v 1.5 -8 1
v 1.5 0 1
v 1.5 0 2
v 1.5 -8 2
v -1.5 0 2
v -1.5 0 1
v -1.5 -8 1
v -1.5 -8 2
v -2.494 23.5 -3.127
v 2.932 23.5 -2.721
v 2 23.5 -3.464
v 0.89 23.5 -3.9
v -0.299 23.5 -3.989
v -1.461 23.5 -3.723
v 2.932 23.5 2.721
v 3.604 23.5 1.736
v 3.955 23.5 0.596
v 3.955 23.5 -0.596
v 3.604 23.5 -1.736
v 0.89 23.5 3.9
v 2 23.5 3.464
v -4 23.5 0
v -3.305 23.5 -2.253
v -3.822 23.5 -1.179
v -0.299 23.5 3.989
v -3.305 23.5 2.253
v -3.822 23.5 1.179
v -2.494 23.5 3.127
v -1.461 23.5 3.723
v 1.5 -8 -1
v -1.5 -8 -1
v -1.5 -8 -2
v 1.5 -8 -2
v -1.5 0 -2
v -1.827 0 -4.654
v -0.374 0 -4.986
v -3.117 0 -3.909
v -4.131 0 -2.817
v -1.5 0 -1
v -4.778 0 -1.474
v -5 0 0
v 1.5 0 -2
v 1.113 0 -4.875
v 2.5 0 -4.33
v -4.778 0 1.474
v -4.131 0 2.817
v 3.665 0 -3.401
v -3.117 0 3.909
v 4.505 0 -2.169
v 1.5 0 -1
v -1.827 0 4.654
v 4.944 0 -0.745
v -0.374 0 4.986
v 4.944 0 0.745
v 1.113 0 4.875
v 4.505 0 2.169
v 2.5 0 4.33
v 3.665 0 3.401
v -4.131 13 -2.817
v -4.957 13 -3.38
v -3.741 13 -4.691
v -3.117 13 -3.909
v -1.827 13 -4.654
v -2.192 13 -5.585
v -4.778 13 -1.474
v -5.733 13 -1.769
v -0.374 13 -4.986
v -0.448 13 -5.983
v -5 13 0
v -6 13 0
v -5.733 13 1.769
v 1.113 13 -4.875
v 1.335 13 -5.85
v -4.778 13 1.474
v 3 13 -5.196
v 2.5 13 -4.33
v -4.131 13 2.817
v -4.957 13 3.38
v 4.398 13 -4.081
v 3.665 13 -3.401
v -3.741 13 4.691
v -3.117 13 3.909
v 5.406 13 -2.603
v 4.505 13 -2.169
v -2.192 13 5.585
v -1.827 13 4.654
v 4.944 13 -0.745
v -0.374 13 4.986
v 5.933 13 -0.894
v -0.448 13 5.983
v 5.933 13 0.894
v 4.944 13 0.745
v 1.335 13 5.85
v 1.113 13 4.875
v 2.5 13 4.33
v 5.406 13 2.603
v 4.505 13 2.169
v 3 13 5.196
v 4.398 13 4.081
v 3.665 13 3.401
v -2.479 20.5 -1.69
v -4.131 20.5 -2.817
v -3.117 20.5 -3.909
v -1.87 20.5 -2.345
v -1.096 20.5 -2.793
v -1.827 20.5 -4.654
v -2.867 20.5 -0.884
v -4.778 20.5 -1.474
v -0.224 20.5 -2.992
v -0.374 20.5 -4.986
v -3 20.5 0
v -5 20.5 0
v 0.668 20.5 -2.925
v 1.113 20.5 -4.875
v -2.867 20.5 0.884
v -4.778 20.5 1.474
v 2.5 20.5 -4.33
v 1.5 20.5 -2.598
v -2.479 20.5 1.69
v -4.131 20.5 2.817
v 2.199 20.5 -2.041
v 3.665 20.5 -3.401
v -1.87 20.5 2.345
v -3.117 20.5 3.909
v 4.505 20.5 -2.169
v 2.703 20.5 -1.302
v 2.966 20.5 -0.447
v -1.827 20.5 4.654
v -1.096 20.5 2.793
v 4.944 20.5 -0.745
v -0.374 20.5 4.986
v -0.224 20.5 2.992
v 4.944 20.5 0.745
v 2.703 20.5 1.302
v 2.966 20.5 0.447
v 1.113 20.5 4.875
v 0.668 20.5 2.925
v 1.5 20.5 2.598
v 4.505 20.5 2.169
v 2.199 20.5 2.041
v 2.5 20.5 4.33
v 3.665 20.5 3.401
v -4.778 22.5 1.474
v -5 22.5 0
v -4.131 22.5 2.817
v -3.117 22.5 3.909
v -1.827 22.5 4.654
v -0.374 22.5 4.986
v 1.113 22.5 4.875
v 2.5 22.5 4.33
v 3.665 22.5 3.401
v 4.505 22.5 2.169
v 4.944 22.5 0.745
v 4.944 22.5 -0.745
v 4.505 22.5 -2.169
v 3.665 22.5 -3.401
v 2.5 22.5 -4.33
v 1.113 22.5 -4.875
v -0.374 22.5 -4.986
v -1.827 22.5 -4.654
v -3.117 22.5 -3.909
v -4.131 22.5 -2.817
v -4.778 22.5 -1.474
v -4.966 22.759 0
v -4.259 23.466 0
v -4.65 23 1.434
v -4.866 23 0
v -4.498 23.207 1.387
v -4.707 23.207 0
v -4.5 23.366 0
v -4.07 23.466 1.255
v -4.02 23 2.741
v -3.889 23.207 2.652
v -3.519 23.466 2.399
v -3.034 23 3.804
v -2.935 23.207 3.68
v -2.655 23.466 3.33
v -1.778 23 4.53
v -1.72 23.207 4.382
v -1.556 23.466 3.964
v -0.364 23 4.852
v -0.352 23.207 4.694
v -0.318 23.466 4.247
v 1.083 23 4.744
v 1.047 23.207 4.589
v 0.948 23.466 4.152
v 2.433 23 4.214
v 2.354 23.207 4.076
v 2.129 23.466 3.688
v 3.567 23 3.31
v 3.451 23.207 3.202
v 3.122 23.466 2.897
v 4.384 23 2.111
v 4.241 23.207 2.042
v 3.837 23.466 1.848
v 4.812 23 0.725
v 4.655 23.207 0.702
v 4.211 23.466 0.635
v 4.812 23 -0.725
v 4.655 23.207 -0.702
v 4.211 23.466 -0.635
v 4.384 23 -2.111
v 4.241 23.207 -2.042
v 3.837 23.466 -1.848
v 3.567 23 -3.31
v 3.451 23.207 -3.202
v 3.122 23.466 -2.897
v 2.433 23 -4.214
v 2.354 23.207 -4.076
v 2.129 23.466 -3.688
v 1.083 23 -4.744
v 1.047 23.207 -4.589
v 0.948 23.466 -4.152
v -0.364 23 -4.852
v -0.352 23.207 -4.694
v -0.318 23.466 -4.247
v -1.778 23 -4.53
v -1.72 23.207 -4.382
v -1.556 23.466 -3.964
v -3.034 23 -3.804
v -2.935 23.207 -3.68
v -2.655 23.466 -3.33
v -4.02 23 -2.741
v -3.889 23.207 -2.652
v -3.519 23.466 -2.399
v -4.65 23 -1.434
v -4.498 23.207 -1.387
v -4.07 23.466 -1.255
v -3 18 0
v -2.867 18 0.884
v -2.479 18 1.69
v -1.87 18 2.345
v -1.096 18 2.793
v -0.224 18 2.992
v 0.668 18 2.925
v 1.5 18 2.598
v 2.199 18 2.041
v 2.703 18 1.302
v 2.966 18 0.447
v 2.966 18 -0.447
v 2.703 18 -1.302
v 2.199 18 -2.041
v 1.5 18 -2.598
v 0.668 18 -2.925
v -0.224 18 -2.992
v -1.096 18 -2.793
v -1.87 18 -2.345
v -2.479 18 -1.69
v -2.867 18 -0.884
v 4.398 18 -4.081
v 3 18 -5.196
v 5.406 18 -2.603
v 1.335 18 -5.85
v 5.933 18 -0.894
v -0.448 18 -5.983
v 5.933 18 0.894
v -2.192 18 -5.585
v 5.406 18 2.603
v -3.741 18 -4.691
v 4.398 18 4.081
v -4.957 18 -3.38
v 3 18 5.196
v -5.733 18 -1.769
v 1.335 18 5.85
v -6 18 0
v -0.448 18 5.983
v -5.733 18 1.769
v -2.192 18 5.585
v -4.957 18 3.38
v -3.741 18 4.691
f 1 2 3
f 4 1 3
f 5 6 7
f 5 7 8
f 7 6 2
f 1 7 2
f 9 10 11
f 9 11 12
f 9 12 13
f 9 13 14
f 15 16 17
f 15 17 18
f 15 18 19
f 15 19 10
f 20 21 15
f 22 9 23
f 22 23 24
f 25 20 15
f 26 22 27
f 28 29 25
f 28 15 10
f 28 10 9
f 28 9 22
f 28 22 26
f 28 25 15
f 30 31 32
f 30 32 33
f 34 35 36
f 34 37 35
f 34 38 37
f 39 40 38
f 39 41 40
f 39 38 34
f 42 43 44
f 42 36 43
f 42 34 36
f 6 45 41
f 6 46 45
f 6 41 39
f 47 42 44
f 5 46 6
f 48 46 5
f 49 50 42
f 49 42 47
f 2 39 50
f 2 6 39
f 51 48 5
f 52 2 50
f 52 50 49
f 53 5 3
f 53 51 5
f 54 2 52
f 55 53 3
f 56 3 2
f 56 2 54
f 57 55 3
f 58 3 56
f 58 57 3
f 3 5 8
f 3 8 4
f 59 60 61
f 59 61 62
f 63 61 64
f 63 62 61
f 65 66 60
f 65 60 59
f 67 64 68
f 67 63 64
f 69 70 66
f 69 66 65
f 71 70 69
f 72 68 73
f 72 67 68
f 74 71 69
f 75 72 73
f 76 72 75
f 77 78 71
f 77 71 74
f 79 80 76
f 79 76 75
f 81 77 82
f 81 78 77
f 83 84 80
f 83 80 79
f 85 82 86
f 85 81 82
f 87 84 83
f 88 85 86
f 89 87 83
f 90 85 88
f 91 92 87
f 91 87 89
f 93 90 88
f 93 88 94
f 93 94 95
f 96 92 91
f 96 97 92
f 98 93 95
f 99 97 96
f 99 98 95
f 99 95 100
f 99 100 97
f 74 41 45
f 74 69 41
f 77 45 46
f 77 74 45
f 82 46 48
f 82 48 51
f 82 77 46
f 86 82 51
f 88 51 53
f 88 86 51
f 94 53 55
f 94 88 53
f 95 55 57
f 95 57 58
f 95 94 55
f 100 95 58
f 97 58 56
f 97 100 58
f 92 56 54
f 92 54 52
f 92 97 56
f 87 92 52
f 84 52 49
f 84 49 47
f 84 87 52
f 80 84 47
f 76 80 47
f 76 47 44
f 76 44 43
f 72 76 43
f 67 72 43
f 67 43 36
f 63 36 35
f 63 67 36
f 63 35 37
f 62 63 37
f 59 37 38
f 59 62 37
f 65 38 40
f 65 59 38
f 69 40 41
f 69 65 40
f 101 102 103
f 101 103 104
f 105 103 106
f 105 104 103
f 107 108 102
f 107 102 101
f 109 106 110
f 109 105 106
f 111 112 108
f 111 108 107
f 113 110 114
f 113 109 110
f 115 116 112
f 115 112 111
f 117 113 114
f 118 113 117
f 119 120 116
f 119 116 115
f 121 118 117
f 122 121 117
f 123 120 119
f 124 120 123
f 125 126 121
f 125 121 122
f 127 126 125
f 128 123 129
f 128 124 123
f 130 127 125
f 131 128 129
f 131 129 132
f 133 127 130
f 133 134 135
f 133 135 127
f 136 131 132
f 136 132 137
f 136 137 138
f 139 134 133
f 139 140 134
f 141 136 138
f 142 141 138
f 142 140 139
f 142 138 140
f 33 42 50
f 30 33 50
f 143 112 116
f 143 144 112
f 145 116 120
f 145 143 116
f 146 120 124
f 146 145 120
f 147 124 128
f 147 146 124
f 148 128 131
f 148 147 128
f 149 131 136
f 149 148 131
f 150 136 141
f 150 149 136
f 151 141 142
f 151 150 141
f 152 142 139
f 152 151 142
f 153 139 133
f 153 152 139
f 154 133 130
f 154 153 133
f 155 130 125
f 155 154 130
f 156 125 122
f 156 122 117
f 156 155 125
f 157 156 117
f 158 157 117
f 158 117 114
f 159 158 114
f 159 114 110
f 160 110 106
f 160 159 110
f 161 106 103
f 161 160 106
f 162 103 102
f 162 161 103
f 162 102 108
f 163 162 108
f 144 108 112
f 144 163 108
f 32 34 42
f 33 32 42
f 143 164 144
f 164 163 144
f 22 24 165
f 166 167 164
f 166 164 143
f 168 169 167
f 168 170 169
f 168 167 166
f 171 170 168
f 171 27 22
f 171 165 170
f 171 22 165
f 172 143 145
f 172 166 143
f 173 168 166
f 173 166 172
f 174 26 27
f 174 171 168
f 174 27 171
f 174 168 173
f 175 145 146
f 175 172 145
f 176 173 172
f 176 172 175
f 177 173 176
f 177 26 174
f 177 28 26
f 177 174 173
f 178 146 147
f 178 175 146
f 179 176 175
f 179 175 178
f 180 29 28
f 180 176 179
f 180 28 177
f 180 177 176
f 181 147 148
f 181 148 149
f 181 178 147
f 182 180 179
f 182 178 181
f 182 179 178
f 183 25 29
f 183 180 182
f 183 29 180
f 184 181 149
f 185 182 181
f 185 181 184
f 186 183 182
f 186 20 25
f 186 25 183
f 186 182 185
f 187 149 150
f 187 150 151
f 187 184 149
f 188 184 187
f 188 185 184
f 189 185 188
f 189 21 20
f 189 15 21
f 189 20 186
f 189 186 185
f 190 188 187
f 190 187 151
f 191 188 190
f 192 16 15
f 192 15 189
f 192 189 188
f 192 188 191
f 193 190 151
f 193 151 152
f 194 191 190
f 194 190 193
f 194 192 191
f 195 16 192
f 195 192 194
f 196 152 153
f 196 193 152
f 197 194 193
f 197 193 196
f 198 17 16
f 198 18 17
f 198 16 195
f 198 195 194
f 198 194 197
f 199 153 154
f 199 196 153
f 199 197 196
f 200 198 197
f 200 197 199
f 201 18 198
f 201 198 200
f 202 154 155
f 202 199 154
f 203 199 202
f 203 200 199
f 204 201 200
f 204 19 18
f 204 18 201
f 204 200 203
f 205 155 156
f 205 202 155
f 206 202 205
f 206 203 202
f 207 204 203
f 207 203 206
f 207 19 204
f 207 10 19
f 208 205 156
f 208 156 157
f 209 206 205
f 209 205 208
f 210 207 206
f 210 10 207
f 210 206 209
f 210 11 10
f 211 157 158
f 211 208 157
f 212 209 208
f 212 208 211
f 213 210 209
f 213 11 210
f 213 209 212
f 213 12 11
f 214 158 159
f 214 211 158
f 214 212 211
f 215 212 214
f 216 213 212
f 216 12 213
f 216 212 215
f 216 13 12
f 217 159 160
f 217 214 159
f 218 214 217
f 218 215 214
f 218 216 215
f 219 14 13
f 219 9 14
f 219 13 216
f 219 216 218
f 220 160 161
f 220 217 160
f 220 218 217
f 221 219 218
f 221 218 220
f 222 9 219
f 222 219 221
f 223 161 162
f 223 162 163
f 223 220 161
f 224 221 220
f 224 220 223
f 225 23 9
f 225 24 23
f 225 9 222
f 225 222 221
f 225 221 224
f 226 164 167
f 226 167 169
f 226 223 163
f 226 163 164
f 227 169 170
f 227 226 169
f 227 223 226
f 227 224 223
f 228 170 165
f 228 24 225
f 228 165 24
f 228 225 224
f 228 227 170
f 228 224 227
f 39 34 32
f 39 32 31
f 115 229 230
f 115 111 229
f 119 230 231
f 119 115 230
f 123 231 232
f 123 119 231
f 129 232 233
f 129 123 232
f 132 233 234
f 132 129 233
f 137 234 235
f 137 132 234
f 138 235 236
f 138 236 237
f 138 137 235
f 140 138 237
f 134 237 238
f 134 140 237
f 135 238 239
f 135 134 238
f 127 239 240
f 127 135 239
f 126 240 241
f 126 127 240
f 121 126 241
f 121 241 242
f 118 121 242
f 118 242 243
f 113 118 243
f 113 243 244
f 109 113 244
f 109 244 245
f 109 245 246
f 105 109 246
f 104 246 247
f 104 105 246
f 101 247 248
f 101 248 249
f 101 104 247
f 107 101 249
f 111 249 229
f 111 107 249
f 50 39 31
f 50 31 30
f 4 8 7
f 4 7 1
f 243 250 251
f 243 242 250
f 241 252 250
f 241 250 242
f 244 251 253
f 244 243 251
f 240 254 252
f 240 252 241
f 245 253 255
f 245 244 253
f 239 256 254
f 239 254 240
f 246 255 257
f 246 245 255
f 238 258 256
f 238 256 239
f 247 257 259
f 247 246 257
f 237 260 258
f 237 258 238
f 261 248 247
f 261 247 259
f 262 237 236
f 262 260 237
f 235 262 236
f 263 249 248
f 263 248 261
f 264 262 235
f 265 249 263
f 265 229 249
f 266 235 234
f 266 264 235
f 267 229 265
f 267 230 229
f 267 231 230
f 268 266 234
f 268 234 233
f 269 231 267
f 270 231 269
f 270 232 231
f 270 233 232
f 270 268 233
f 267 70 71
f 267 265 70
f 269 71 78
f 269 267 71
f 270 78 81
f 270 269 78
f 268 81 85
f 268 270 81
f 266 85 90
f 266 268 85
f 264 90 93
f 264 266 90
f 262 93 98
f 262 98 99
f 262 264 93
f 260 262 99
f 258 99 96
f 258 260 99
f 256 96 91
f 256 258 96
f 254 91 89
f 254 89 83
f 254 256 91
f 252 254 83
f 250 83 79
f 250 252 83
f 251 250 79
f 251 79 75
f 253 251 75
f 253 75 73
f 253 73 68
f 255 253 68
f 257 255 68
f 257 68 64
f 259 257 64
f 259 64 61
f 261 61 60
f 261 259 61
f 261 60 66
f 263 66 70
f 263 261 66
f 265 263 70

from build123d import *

# Parameters (mm, degrees)
ESQUISSE3_W        = 3
ESQUISSE3_H        = 1
BOSS_EXTRU_1_DEPTH = 8


with BuildPart() as part:
    # Esquisse1 → Révolution1 (revolve)
    with BuildSketch(Plane.XY):
        Polygon((0, 0), (-5, 0), (-5, 13), (-6, 13), (-6, 18), (-3, 18), (-3, 20.5), (0, 20.5), align=None)
    revolve(axis=Axis((0, 0, 0), (0, 1, 0)))

    # Esquisse2 → Révolution2 (revolve)
    with BuildSketch(Plane.XY):
        with BuildLine():
            Line((0, 20.5), (-5, 20.5))
            Line((-5, 20.5), (-5, 22.5))
            ThreePointArc((-5, 22.5), (-4.707106781, 23.207106781), (-4, 23.5))
            Line((-4, 23.5), (0, 23.5))
            Line((0, 23.5), (0, 20.5))
        make_face()
    revolve(axis=Axis((0, 20.5, 0), (0, 1, 0)))

    # Esquisse3 → Boss.-Extru.1 (add)
    with BuildSketch(Plane.XZ):
        with Locations((0, -1.5)):
            Rectangle(ESQUISSE3_W, ESQUISSE3_H)
        with Locations((0, 1.5)):
            Rectangle(ESQUISSE3_W, ESQUISSE3_H)
    extrude(amount=BOSS_EXTRU_1_DEPTH)


solid = part.part
